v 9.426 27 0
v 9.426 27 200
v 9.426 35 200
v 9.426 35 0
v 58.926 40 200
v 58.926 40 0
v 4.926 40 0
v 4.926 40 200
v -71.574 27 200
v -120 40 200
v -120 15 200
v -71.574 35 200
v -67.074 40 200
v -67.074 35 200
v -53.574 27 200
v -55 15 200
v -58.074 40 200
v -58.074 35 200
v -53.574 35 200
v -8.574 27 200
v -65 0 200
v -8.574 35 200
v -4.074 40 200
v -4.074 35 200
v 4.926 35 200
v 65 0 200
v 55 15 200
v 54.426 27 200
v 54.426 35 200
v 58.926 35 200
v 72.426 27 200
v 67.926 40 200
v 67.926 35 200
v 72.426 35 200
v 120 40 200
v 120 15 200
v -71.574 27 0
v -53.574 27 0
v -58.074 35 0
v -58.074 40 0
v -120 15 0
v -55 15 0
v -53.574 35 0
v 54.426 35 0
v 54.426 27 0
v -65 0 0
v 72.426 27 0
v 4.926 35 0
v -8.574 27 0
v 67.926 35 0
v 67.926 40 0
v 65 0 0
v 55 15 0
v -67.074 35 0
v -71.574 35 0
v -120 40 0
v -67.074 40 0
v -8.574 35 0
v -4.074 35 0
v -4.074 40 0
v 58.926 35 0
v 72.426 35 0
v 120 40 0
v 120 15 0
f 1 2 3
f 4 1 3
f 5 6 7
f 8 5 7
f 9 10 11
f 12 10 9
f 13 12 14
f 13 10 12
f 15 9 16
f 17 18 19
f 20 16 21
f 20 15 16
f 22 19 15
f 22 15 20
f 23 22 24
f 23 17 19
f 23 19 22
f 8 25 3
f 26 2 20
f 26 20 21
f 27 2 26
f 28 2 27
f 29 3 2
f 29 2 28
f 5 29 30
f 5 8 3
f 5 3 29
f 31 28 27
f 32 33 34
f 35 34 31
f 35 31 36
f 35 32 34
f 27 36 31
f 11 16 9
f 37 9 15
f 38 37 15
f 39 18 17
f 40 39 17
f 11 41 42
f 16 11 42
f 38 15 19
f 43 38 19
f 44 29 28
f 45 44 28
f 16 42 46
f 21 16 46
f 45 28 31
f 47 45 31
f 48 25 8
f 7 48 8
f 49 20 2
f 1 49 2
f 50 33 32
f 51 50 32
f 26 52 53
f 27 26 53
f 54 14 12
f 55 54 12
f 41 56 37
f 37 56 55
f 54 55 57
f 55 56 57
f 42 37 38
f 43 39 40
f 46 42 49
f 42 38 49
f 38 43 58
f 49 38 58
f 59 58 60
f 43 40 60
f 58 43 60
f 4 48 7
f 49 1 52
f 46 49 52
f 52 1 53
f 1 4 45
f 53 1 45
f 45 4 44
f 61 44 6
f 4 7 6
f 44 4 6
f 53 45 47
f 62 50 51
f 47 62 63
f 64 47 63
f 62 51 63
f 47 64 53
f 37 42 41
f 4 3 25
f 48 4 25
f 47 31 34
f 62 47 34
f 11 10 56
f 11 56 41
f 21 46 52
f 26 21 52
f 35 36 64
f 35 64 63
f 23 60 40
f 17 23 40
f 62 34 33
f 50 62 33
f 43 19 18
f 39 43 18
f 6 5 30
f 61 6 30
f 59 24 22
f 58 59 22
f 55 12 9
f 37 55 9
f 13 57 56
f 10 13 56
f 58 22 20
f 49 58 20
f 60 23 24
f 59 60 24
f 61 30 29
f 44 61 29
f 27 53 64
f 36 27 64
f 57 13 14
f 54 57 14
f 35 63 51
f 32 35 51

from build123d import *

# Parameters (mm, degrees)
EXTRUDE_1_DEPTH     = 200
CUT_EXTRUDE_1_DEPTH = 201


with BuildPart() as part:
    # Эскиз1 → Бобышка-Вытянуть1 (new body)
    with BuildSketch(Plane.XY):
        Polygon((0, 0), (65, 0), (55, 15), (120, 15), (120, 40), (0, 40), (-120, 40), (-120, 15), (-55, 15), (-65, 0), align=None)
    extrude(amount=EXTRUDE_1_DEPTH)

    # Эскиз2 → Вырез-Вытянуть1 (cut, through all)
    with BuildSketch(Plane.XY.offset(200)):
        Polygon((-8.573821021, 27), (9.426178979, 27), (9.426178979, 35), (4.926178979, 35), (4.926178979, 40), (-4.073821021, 40), (-4.073821021, 35), (-8.573821021, 35), align=None)
        Polygon((54.426178979, 27), (72.426178979, 27), (72.426178979, 35), (67.926178979, 35), (67.926178979, 40), (58.926178979, 40), (58.926178979, 35), (54.426178979, 35), align=None)
        Polygon((-71.573821021, 27), (-53.573821021, 27), (-53.573821021, 35), (-58.073821021, 35), (-58.073821021, 40), (-67.073821021, 40), (-67.073821021, 35), (-71.573821021, 35), align=None)
    extrude(amount=-CUT_EXTRUDE_1_DEPTH, mode=Mode.SUBTRACT)


solid = part.part
